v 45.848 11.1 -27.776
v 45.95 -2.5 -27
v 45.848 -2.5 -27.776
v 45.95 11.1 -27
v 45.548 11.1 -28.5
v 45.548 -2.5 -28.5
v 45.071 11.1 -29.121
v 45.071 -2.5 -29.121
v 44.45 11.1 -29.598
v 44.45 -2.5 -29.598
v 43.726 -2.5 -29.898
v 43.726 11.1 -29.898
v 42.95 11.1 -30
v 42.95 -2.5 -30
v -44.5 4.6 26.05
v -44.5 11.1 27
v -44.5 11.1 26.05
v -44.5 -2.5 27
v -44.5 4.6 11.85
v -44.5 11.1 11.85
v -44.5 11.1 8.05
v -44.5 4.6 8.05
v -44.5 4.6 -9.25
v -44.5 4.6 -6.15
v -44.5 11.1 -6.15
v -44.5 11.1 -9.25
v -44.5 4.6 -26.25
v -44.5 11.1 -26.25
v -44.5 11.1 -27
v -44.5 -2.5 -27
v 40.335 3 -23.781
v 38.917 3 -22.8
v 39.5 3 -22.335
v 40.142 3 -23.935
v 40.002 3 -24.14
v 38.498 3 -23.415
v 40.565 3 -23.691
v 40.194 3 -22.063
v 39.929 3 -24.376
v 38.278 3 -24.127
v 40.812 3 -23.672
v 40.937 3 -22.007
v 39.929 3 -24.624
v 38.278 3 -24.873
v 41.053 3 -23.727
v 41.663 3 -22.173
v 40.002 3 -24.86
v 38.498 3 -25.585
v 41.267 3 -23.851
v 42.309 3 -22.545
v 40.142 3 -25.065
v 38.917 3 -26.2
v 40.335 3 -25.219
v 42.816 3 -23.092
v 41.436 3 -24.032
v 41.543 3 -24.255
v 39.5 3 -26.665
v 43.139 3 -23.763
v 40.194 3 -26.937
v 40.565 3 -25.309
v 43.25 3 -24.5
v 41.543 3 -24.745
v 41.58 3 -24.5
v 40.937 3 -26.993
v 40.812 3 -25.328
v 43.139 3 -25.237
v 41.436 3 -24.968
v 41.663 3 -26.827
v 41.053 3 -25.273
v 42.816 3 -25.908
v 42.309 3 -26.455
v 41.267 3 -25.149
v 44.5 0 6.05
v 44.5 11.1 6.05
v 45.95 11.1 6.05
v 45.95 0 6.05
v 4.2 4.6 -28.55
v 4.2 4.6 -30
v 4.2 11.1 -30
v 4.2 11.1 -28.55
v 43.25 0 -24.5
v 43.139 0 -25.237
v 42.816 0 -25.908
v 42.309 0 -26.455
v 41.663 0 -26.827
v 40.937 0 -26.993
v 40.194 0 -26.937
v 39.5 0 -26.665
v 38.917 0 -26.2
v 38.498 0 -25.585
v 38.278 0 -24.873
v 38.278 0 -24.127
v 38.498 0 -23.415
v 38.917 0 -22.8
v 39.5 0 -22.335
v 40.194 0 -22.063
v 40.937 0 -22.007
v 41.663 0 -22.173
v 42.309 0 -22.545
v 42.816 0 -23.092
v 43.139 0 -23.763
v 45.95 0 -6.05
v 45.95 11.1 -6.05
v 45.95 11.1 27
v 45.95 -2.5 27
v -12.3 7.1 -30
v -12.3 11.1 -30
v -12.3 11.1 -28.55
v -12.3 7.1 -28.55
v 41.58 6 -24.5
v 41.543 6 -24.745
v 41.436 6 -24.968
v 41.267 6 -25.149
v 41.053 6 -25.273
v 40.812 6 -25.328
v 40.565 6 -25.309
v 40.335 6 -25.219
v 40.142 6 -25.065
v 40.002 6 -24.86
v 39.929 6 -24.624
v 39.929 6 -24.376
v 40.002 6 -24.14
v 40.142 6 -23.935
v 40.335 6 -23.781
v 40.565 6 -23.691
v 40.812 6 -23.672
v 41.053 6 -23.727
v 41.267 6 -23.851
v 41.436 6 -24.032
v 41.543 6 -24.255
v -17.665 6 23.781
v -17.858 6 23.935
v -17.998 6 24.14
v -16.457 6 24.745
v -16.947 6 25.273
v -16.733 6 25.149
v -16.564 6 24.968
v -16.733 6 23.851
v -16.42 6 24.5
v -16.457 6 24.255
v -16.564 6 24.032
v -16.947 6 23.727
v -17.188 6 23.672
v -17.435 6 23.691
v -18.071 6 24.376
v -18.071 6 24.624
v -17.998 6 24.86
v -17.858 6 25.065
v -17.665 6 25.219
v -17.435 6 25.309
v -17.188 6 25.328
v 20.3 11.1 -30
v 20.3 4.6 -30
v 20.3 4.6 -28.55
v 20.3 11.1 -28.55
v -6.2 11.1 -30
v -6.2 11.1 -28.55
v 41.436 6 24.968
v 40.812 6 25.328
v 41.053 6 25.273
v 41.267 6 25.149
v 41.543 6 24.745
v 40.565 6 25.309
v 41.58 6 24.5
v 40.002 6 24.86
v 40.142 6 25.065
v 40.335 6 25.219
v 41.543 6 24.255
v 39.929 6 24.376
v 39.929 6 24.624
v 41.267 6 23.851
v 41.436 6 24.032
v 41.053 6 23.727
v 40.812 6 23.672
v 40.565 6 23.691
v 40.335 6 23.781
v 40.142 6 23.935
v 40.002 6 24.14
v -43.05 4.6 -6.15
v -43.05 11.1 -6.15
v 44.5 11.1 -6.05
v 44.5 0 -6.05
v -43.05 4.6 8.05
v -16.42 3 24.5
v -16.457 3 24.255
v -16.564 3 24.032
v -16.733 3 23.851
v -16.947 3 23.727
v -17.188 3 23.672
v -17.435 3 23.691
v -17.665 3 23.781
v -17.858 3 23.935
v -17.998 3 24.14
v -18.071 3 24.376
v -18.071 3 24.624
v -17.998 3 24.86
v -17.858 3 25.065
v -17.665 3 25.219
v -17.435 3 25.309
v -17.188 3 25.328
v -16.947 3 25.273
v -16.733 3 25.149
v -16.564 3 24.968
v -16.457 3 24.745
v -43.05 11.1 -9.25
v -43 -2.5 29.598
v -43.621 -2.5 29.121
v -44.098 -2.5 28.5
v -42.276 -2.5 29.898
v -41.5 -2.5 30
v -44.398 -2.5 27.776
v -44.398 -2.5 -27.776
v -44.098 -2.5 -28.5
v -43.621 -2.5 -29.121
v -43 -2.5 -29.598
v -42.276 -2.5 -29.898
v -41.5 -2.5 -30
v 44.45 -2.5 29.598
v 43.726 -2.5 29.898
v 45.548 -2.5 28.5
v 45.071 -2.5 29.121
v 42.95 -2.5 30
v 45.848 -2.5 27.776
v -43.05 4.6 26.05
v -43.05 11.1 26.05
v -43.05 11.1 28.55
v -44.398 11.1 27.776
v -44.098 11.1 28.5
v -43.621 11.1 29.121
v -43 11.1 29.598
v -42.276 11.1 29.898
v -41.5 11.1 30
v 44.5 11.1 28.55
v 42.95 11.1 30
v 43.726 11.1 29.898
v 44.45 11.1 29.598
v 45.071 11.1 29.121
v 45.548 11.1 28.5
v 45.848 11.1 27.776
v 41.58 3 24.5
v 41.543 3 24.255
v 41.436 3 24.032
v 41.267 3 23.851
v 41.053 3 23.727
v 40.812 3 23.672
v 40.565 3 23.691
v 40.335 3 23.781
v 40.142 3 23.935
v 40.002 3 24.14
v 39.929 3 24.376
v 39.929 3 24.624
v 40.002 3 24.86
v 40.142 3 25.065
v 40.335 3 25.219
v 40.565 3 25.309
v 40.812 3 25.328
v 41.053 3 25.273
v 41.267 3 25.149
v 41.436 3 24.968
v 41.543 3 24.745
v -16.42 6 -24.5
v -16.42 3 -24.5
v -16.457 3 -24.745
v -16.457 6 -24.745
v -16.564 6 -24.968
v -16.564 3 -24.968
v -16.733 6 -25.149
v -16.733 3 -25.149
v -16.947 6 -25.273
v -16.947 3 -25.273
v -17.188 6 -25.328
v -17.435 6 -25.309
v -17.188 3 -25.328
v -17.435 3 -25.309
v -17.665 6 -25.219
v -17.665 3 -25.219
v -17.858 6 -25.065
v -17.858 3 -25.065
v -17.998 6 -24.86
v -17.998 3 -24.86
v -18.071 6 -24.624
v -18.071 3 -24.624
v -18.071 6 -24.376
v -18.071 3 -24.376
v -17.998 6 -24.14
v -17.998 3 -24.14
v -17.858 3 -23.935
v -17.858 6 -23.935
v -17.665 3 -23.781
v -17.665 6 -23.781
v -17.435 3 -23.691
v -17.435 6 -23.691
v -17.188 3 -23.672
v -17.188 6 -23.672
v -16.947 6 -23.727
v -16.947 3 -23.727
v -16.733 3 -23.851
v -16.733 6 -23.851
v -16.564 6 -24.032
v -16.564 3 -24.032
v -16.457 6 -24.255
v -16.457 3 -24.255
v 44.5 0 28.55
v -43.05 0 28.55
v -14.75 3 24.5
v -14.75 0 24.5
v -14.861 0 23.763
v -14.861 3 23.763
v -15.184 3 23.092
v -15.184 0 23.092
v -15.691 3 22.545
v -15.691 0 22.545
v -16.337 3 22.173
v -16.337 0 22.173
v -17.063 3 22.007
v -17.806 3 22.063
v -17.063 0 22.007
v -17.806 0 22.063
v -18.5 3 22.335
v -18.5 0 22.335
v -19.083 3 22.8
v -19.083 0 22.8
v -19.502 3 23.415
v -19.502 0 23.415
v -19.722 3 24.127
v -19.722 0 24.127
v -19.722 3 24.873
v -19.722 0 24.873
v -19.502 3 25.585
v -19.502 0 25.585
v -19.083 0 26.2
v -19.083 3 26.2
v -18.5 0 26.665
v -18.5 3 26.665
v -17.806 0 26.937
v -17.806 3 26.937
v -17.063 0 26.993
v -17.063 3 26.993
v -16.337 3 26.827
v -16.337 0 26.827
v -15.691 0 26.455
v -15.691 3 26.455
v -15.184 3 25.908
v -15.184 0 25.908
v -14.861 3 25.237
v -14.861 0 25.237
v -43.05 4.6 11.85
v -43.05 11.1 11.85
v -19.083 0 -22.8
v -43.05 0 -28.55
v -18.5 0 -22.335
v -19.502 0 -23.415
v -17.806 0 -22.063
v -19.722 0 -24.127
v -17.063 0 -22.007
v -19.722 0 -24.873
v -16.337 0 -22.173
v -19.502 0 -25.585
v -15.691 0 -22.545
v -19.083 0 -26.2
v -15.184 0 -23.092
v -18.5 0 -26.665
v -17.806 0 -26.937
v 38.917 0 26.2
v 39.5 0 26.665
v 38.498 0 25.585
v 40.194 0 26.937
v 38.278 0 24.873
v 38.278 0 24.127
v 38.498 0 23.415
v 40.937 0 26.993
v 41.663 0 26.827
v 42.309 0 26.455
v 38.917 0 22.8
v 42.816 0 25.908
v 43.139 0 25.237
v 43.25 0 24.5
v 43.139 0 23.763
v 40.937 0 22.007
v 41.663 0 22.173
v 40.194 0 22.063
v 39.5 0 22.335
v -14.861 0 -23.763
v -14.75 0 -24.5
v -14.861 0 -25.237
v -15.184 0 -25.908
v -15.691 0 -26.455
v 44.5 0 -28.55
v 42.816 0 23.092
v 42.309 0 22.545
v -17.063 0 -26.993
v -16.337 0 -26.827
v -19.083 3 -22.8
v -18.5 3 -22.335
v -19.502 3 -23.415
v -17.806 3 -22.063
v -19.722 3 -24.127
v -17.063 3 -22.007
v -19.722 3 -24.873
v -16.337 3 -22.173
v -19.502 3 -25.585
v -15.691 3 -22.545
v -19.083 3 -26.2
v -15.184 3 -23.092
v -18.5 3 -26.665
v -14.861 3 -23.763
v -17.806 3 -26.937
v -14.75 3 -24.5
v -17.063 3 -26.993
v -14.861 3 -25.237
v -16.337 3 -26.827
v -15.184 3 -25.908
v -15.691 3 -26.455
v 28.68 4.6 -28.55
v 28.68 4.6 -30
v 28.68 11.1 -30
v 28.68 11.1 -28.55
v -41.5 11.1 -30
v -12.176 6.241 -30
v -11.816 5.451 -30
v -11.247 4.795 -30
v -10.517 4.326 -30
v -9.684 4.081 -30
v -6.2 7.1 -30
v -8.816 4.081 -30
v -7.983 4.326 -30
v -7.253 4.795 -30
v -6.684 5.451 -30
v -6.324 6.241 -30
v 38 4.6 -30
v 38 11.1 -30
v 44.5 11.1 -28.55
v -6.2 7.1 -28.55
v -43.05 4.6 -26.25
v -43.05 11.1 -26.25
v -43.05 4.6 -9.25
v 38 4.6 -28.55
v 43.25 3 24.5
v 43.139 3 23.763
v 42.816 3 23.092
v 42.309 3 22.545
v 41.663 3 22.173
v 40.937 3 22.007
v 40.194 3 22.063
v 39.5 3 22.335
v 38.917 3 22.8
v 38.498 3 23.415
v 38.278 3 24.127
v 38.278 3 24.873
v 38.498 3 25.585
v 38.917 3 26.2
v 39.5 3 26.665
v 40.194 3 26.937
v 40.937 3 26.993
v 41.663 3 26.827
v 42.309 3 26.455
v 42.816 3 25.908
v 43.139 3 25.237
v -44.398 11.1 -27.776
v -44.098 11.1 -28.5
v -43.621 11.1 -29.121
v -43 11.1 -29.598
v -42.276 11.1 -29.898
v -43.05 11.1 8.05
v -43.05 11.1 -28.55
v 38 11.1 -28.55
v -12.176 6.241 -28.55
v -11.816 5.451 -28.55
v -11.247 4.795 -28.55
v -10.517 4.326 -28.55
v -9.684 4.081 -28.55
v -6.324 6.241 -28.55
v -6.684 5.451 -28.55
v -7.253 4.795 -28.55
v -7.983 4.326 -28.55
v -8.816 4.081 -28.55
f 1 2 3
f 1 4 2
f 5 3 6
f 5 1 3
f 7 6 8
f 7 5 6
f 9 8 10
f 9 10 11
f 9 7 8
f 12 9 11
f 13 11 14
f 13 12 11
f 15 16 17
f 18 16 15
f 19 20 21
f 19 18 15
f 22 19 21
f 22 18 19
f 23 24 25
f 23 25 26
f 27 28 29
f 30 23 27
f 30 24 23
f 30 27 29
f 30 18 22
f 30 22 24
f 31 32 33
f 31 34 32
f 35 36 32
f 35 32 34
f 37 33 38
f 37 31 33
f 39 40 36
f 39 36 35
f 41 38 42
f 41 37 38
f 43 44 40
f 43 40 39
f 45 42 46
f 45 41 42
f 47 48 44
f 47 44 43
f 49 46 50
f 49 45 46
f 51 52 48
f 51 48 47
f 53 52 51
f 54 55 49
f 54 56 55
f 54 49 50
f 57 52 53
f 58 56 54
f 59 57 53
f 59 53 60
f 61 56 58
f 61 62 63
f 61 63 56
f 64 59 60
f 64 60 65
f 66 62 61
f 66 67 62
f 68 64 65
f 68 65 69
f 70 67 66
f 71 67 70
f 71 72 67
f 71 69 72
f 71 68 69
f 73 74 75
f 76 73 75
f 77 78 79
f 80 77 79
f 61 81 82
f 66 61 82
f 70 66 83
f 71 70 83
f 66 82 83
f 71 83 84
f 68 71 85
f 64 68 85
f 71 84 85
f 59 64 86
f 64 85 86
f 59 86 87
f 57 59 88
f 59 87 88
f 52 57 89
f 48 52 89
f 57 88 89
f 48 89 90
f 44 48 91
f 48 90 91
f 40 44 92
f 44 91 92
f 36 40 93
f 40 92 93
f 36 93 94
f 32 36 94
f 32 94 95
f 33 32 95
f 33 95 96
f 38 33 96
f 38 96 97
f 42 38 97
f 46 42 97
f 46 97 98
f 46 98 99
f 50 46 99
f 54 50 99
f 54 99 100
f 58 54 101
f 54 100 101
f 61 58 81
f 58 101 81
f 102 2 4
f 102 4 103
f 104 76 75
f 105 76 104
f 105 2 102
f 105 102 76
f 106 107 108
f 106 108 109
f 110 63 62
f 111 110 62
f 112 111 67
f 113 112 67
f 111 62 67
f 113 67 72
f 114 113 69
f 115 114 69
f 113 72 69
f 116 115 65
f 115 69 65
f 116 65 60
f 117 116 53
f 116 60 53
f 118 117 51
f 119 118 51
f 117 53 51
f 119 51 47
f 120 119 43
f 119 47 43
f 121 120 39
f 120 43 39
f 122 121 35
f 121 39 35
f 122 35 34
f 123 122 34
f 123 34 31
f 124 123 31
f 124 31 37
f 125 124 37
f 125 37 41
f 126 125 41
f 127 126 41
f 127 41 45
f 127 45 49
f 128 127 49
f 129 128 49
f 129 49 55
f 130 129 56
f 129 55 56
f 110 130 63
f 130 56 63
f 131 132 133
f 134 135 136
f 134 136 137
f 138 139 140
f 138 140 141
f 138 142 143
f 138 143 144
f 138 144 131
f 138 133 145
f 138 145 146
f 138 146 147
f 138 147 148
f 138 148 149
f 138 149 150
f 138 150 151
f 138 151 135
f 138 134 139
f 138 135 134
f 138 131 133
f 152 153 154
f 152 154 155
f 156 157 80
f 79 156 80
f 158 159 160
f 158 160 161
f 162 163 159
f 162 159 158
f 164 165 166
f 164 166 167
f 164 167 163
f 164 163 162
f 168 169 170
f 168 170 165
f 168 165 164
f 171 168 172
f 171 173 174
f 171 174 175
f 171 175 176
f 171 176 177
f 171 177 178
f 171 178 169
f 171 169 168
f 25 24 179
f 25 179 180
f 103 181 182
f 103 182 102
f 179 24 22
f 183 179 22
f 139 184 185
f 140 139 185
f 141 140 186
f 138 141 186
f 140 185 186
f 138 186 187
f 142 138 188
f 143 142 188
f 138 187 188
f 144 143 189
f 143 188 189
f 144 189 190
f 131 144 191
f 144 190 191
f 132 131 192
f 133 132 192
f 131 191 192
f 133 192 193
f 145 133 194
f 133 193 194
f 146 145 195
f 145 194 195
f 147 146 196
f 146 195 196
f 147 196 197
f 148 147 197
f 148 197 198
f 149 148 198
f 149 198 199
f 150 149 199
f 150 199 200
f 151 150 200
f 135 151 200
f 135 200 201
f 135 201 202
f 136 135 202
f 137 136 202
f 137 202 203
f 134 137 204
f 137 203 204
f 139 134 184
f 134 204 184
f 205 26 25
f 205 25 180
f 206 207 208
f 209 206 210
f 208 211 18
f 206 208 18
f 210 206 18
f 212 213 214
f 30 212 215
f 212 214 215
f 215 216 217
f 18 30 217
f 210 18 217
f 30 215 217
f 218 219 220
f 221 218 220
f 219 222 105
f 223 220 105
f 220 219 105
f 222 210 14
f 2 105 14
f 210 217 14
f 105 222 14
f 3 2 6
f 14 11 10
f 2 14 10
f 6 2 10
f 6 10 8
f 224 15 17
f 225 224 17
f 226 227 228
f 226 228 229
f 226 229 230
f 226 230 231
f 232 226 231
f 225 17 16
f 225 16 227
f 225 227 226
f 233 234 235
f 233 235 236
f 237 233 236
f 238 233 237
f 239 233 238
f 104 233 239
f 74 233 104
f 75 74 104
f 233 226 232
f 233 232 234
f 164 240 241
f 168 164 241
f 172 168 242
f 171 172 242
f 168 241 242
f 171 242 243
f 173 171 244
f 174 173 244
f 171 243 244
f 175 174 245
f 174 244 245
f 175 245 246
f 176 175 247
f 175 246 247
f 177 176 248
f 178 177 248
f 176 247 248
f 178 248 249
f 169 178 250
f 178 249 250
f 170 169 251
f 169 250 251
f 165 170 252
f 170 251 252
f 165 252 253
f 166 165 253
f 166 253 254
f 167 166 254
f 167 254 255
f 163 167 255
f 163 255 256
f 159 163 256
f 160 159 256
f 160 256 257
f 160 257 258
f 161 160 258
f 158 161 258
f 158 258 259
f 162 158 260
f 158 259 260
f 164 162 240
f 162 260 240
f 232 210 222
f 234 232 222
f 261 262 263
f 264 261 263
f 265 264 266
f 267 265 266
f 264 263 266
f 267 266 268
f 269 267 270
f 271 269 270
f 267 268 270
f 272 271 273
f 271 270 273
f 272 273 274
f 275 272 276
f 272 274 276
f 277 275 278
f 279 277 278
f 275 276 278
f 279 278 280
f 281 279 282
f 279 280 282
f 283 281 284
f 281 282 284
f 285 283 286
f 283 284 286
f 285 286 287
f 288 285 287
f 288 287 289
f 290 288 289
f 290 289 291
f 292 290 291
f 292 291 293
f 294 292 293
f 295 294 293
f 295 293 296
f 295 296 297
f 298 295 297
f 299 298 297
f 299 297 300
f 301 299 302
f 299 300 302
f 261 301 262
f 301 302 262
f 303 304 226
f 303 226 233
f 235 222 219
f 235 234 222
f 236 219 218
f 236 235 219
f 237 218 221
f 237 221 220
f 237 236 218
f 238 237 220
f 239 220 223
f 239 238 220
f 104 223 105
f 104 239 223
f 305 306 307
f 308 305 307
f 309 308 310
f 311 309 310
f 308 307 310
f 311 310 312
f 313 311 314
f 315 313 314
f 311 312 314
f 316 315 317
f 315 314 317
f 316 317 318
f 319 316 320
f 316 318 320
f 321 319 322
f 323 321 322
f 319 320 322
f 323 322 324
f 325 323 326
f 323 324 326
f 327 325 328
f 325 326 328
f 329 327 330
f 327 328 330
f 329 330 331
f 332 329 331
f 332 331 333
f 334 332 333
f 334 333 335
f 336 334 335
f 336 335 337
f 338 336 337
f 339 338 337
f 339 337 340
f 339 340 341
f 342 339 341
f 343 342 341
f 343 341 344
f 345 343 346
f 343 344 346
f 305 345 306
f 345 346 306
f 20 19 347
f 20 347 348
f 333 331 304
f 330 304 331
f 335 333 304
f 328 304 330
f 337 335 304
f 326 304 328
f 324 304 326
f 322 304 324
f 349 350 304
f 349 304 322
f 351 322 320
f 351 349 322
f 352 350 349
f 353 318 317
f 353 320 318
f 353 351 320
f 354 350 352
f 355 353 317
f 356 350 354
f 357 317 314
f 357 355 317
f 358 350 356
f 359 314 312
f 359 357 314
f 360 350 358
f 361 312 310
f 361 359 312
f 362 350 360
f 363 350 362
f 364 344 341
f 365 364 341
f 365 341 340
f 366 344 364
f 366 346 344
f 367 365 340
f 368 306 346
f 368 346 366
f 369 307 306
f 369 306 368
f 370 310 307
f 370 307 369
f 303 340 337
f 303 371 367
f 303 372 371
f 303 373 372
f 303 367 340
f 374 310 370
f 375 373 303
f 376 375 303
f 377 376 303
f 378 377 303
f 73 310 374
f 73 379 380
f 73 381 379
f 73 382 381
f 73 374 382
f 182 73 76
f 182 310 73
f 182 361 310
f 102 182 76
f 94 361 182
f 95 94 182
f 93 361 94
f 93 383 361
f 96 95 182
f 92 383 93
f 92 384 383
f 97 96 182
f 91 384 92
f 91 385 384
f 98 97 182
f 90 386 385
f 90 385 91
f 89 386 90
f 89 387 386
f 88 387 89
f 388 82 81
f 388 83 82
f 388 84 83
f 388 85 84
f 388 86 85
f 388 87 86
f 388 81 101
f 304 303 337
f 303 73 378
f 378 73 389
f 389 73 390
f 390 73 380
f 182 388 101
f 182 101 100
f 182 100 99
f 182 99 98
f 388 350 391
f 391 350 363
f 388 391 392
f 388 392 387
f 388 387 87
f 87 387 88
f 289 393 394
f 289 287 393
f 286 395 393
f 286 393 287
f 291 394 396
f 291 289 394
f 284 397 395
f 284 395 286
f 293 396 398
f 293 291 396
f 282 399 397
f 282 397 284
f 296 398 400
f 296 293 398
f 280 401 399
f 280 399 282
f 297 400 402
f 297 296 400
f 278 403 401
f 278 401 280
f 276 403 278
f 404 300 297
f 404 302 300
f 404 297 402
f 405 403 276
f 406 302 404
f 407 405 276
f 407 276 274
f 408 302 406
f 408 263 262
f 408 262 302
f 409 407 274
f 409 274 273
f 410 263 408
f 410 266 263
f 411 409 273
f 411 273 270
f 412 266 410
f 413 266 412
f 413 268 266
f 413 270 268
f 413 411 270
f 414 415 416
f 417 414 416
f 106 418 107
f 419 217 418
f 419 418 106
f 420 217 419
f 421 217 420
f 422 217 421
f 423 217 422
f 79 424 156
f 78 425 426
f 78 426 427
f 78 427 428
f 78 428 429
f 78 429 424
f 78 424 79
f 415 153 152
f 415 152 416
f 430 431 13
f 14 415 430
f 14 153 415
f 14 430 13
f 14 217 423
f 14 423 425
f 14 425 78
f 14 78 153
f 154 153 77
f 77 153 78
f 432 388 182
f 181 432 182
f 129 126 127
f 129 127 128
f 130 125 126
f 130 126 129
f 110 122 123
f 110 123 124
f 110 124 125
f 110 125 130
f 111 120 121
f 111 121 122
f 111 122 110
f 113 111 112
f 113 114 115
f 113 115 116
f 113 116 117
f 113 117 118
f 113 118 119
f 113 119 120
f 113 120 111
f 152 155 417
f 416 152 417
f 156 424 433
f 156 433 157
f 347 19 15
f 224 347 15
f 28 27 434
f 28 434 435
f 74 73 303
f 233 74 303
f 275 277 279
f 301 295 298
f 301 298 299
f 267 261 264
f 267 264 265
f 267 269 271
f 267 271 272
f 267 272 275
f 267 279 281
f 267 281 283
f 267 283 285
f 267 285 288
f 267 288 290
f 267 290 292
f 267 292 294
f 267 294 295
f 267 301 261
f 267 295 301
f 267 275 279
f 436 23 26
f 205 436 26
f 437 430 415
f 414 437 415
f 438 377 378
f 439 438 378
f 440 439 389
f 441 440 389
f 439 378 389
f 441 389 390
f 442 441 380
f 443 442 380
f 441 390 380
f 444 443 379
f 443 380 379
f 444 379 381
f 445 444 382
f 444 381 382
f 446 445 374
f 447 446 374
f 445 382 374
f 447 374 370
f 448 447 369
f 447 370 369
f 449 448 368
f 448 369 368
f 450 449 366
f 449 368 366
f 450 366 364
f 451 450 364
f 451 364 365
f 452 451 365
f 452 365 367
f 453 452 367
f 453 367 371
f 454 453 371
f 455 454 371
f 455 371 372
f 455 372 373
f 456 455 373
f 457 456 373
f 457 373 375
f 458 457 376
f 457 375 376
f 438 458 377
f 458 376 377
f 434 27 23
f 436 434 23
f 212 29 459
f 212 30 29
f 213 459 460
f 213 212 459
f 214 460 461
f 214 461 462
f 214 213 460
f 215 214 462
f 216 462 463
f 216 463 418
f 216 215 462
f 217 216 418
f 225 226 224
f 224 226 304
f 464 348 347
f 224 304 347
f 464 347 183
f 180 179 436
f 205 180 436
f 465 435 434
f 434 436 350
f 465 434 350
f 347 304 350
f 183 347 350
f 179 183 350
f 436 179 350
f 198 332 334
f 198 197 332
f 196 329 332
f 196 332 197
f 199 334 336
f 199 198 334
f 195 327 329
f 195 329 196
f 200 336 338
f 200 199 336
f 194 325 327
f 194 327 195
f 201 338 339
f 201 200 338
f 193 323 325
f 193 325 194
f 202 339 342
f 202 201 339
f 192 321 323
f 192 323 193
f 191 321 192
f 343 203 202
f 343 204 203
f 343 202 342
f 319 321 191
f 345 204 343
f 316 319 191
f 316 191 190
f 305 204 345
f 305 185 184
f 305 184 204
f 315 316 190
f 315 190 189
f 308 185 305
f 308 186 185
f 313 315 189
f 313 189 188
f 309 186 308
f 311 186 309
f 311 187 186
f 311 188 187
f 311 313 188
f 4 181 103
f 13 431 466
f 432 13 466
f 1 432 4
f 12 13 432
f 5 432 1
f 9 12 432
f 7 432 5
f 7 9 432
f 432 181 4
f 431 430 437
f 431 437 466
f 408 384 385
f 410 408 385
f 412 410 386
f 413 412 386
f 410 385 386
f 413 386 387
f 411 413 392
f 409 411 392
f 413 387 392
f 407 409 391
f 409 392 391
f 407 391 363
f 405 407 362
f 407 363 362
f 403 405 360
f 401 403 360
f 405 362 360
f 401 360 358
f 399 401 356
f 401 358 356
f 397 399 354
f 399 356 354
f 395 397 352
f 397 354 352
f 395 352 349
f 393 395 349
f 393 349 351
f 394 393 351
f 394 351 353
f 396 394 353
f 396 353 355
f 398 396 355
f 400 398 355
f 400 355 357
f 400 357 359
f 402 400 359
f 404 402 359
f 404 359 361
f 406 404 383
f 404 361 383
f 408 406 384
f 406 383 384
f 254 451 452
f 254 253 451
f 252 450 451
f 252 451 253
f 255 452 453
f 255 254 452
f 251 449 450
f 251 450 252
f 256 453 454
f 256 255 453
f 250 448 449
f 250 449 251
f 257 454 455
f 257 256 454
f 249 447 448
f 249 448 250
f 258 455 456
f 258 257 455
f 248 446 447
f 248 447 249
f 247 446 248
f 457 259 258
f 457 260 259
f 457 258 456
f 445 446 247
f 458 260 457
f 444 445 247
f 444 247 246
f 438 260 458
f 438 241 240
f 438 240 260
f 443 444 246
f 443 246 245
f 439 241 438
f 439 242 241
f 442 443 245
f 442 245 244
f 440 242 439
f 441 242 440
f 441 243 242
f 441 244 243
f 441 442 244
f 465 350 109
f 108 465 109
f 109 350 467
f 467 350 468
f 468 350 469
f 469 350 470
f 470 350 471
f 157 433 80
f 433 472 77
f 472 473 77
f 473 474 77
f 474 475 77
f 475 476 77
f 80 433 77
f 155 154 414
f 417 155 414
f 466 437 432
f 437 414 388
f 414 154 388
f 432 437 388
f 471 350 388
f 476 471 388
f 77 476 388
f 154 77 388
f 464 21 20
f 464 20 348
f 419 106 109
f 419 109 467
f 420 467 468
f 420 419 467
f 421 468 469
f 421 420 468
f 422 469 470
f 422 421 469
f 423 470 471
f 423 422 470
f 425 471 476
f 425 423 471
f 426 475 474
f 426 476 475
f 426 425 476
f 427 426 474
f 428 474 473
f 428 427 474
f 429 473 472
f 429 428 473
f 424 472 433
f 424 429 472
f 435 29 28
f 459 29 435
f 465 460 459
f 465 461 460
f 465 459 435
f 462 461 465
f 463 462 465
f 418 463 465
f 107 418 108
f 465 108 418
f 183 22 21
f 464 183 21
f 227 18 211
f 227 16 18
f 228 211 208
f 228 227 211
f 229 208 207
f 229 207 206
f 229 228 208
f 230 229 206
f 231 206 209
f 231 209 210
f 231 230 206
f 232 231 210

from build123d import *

# Parameters (mm, degrees)
CROQUIS1_W              = 89
CROQUIS1_H              = 60
SALIENTE_EXTRUIR1_DEPTH = 2.5
CROQUIS2_R              = 2.5
SALIENTE_EXTRUIR2_DEPTH = 3
CROQUIS3_R              = 0.83
SALIENTE_EXTRUIR3_DEPTH = 3
CROQUIS4_W              = 89
CROQUIS4_H              = 1.45
SALIENTE_EXTRUIR4_DEPTH = 11.1
CROQUIS5_W              = 1.45
CROQUIS5_H              = 60
SALIENTE_EXTRUIR5_DEPTH = 13.6
CORTAR_EXTRUIR1_REACH   = 62
CORTAR_EXTRUIR2_REACH   = 62
CROQUIS7_W              = 16.1
CROQUIS7_H              = 6.5
CORTAR_EXTRUIR3_REACH   = 62
CROQUIS8_W              = 9.32
CROQUIS8_H              = 6.5
REDONDEO1_R             = 3
CROQUIS12_W             = 1.45
CROQUIS12_H             = 57.1
SALIENTE_EXTRUIR7_DEPTH = 11.1
CORTAR_EXTRUIR5_REACH   = 92.45
CROQUIS13_W             = 17
CROQUIS13_H             = 6.5
CORTAR_EXTRUIR6_REACH   = 92.45
CROQUIS14_W             = 14.2
CROQUIS14_H             = 6.5
REDONDEO2_R             = 3
CROQUIS15_W             = 1.45
CROQUIS15_H             = 12.1
CORTAR_EXTRUIR7_DEPTH   = 11.1


with BuildPart() as part:
    # Croquis1 → Saliente-Extruir1 (new body)
    with BuildSketch(Plane(origin=(0, 0, 0), x_dir=(1, 0, 0), z_dir=(0, 1, 0))):
        Rectangle(CROQUIS1_W, CROQUIS1_H)
    extrude(amount=-SALIENTE_EXTRUIR1_DEPTH)

    # Croquis2 → Saliente-Extruir2 (add)
    with BuildSketch(Plane(origin=(0, 0, 0), x_dir=(1, 0, 0), z_dir=(0, 1, 0))):
        with Locations((40.75, 24.5)):
            Circle(CROQUIS2_R)
        with Locations((40.75, -24.5)):
            Circle(CROQUIS2_R)
        with Locations((-17.25, 24.5)):
            Circle(CROQUIS2_R)
        with Locations((-17.25, -24.5)):
            Circle(CROQUIS2_R)
    extrude(amount=SALIENTE_EXTRUIR2_DEPTH)

    # Croquis3 → Saliente-Extruir3 (add)
    with BuildSketch(Plane(origin=(0, 3, 0), x_dir=(1, 0, 0), z_dir=(0, 1, 0))):
        with Locations((-17.25, 24.5)):
            Circle(CROQUIS3_R)
        with Locations((40.75, 24.5)):
            Circle(CROQUIS3_R)
        with Locations((40.75, -24.5)):
            Circle(CROQUIS3_R)
        with Locations((-17.25, -24.5)):
            Circle(CROQUIS3_R)
    extrude(amount=SALIENTE_EXTRUIR3_DEPTH)

    # Croquis4 → Saliente-Extruir4 (add)
    with BuildSketch(Plane(origin=(0, 0, 0), x_dir=(1, 0, 0), z_dir=(0, 1, 0))):
        with Locations((0, -29.275)):
            Rectangle(CROQUIS4_W, CROQUIS4_H)
        with Locations((0, 29.275)):
            Rectangle(CROQUIS4_W, CROQUIS4_H)
    extrude(amount=SALIENTE_EXTRUIR4_DEPTH)

    # Croquis5 → Saliente-Extruir5 (add)
    with BuildSketch(Plane.XZ.offset(2.5)):
        with Locations((45.225, 0)):
            Rectangle(CROQUIS5_W, CROQUIS5_H)
    extrude(amount=-SALIENTE_EXTRUIR5_DEPTH)

    # Croquis6 → Cortar-Extruir1 (cut, up to next)
    with BuildSketch(Plane(origin=(0, 0, -30), x_dir=(-1, 0, 0), z_dir=(0, 0, -1)), mode=Mode.PRIVATE) as cortar_extruir1_sk1:
        with BuildLine():
            Line((6.2, 7.1), (6.2, 11.1))
            Line((6.2, 11.1), (12.3, 11.1))
            Line((12.3, 11.1), (12.3, 7.1))
            ThreePointArc((12.3, 7.1), (9.25, 4.05), (6.2, 7.1))
        make_face()
    cortar_extruir1_tool1 = extrude(cortar_extruir1_sk1.sketch, amount=-CORTAR_EXTRUIR1_REACH, mode=Mode.PRIVATE) & part.part
    add(cortar_extruir1_tool1.solids().sort_by_distance((-9.25, 7.866038, -30))[0], mode=Mode.SUBTRACT)

    # Croquis7 → Cortar-Extruir2 (cut, up to next)
    with BuildSketch(Plane(origin=(0, 0, -30), x_dir=(-1, 0, 0), z_dir=(0, 0, -1)), mode=Mode.PRIVATE) as cortar_extruir2_sk1:
        with Locations((-12.25, 7.85)):
            Rectangle(CROQUIS7_W, CROQUIS7_H)
    cortar_extruir2_tool1 = extrude(cortar_extruir2_sk1.sketch, amount=-CORTAR_EXTRUIR2_REACH, mode=Mode.PRIVATE) & part.part
    add(cortar_extruir2_tool1.solids().sort_by_distance((12.25, 7.85, -30))[0], mode=Mode.SUBTRACT)

    # Croquis8 → Cortar-Extruir3 (cut, up to next)
    with BuildSketch(Plane(origin=(0, 0, -30), x_dir=(-1, 0, 0), z_dir=(0, 0, -1)), mode=Mode.PRIVATE) as cortar_extruir3_sk1:
        with Locations((-33.34, 7.85)):
            Rectangle(CROQUIS8_W, CROQUIS8_H)
    cortar_extruir3_tool1 = extrude(cortar_extruir3_sk1.sketch, amount=-CORTAR_EXTRUIR3_REACH, mode=Mode.PRIVATE) & part.part
    add(cortar_extruir3_tool1.solids().sort_by_distance((33.34, 7.85, -30))[0], mode=Mode.SUBTRACT)

    # Redondeo1
    redondeo1_edges = [part.edges().sort_by_distance(p)[0] for p in [
        (45.95, 4.3, 30),
        (45.95, 4.3, -30),
    ]]
    fillet(redondeo1_edges, radius=REDONDEO1_R)

    # Croquis12 → Saliente-Extruir7 (add)
    with BuildSketch(Plane(origin=(0, 0, 0), x_dir=(1, 0, 0), z_dir=(0, 1, 0))):
        with Locations((-43.775, 0)):
            Rectangle(CROQUIS12_W, CROQUIS12_H)
    extrude(amount=SALIENTE_EXTRUIR7_DEPTH)

    # Croquis13 → Cortar-Extruir5 (cut, up to next)
    with BuildSketch(Plane.ZY.offset(44.5), mode=Mode.PRIVATE) as cortar_extruir5_sk1:
        with Locations((-17.75, 7.85)):
            Rectangle(CROQUIS13_W, CROQUIS13_H)
    cortar_extruir5_tool1 = extrude(cortar_extruir5_sk1.sketch, amount=-CORTAR_EXTRUIR5_REACH, mode=Mode.PRIVATE) & part.part
    add(cortar_extruir5_tool1.solids().sort_by_distance((-44.5, 7.85, -17.75))[0], mode=Mode.SUBTRACT)

    # Croquis14 → Cortar-Extruir6 (cut, up to next)
    with BuildSketch(Plane.ZY.offset(44.5), mode=Mode.PRIVATE) as cortar_extruir6_sk1:
        with Locations((0.95, 7.85)):
            Rectangle(CROQUIS14_W, CROQUIS14_H)
    cortar_extruir6_tool1 = extrude(cortar_extruir6_sk1.sketch, amount=-CORTAR_EXTRUIR6_REACH, mode=Mode.PRIVATE) & part.part
    add(cortar_extruir6_tool1.solids().sort_by_distance((-44.5, 7.85, 0.95))[0], mode=Mode.SUBTRACT)
    # Croquis14 → Cortar-Extruir6 (cut, up to next)
    with BuildSketch(Plane.ZY.offset(44.5), mode=Mode.PRIVATE) as cortar_extruir6_sk2:
        with Locations((18.95, 7.85)):
            Rectangle(CROQUIS14_W, CROQUIS14_H)
    cortar_extruir6_tool2 = extrude(cortar_extruir6_sk2.sketch, amount=-CORTAR_EXTRUIR6_REACH, mode=Mode.PRIVATE) & part.part
    add(cortar_extruir6_tool2.solids().sort_by_distance((-44.5, 7.85, 18.95))[0], mode=Mode.SUBTRACT)

    # Redondeo2
    redondeo2_edges = [part.edges().sort_by_distance(p)[0] for p in [
        (-44.5, 4.3, 30),
        (-44.5, 4.3, -30),
    ]]
    fillet(redondeo2_edges, radius=REDONDEO2_R)

    # Croquis15 → Cortar-Extruir7 (cut)
    with BuildSketch(Plane(origin=(0, 11.1, 0), x_dir=(1, 0, 0), z_dir=(0, 1, 0))):
        with Locations((45.225, 0)):
            Rectangle(CROQUIS15_W, CROQUIS15_H)
    extrude(amount=-CORTAR_EXTRUIR7_DEPTH, mode=Mode.SUBTRACT)


solid = part.part
